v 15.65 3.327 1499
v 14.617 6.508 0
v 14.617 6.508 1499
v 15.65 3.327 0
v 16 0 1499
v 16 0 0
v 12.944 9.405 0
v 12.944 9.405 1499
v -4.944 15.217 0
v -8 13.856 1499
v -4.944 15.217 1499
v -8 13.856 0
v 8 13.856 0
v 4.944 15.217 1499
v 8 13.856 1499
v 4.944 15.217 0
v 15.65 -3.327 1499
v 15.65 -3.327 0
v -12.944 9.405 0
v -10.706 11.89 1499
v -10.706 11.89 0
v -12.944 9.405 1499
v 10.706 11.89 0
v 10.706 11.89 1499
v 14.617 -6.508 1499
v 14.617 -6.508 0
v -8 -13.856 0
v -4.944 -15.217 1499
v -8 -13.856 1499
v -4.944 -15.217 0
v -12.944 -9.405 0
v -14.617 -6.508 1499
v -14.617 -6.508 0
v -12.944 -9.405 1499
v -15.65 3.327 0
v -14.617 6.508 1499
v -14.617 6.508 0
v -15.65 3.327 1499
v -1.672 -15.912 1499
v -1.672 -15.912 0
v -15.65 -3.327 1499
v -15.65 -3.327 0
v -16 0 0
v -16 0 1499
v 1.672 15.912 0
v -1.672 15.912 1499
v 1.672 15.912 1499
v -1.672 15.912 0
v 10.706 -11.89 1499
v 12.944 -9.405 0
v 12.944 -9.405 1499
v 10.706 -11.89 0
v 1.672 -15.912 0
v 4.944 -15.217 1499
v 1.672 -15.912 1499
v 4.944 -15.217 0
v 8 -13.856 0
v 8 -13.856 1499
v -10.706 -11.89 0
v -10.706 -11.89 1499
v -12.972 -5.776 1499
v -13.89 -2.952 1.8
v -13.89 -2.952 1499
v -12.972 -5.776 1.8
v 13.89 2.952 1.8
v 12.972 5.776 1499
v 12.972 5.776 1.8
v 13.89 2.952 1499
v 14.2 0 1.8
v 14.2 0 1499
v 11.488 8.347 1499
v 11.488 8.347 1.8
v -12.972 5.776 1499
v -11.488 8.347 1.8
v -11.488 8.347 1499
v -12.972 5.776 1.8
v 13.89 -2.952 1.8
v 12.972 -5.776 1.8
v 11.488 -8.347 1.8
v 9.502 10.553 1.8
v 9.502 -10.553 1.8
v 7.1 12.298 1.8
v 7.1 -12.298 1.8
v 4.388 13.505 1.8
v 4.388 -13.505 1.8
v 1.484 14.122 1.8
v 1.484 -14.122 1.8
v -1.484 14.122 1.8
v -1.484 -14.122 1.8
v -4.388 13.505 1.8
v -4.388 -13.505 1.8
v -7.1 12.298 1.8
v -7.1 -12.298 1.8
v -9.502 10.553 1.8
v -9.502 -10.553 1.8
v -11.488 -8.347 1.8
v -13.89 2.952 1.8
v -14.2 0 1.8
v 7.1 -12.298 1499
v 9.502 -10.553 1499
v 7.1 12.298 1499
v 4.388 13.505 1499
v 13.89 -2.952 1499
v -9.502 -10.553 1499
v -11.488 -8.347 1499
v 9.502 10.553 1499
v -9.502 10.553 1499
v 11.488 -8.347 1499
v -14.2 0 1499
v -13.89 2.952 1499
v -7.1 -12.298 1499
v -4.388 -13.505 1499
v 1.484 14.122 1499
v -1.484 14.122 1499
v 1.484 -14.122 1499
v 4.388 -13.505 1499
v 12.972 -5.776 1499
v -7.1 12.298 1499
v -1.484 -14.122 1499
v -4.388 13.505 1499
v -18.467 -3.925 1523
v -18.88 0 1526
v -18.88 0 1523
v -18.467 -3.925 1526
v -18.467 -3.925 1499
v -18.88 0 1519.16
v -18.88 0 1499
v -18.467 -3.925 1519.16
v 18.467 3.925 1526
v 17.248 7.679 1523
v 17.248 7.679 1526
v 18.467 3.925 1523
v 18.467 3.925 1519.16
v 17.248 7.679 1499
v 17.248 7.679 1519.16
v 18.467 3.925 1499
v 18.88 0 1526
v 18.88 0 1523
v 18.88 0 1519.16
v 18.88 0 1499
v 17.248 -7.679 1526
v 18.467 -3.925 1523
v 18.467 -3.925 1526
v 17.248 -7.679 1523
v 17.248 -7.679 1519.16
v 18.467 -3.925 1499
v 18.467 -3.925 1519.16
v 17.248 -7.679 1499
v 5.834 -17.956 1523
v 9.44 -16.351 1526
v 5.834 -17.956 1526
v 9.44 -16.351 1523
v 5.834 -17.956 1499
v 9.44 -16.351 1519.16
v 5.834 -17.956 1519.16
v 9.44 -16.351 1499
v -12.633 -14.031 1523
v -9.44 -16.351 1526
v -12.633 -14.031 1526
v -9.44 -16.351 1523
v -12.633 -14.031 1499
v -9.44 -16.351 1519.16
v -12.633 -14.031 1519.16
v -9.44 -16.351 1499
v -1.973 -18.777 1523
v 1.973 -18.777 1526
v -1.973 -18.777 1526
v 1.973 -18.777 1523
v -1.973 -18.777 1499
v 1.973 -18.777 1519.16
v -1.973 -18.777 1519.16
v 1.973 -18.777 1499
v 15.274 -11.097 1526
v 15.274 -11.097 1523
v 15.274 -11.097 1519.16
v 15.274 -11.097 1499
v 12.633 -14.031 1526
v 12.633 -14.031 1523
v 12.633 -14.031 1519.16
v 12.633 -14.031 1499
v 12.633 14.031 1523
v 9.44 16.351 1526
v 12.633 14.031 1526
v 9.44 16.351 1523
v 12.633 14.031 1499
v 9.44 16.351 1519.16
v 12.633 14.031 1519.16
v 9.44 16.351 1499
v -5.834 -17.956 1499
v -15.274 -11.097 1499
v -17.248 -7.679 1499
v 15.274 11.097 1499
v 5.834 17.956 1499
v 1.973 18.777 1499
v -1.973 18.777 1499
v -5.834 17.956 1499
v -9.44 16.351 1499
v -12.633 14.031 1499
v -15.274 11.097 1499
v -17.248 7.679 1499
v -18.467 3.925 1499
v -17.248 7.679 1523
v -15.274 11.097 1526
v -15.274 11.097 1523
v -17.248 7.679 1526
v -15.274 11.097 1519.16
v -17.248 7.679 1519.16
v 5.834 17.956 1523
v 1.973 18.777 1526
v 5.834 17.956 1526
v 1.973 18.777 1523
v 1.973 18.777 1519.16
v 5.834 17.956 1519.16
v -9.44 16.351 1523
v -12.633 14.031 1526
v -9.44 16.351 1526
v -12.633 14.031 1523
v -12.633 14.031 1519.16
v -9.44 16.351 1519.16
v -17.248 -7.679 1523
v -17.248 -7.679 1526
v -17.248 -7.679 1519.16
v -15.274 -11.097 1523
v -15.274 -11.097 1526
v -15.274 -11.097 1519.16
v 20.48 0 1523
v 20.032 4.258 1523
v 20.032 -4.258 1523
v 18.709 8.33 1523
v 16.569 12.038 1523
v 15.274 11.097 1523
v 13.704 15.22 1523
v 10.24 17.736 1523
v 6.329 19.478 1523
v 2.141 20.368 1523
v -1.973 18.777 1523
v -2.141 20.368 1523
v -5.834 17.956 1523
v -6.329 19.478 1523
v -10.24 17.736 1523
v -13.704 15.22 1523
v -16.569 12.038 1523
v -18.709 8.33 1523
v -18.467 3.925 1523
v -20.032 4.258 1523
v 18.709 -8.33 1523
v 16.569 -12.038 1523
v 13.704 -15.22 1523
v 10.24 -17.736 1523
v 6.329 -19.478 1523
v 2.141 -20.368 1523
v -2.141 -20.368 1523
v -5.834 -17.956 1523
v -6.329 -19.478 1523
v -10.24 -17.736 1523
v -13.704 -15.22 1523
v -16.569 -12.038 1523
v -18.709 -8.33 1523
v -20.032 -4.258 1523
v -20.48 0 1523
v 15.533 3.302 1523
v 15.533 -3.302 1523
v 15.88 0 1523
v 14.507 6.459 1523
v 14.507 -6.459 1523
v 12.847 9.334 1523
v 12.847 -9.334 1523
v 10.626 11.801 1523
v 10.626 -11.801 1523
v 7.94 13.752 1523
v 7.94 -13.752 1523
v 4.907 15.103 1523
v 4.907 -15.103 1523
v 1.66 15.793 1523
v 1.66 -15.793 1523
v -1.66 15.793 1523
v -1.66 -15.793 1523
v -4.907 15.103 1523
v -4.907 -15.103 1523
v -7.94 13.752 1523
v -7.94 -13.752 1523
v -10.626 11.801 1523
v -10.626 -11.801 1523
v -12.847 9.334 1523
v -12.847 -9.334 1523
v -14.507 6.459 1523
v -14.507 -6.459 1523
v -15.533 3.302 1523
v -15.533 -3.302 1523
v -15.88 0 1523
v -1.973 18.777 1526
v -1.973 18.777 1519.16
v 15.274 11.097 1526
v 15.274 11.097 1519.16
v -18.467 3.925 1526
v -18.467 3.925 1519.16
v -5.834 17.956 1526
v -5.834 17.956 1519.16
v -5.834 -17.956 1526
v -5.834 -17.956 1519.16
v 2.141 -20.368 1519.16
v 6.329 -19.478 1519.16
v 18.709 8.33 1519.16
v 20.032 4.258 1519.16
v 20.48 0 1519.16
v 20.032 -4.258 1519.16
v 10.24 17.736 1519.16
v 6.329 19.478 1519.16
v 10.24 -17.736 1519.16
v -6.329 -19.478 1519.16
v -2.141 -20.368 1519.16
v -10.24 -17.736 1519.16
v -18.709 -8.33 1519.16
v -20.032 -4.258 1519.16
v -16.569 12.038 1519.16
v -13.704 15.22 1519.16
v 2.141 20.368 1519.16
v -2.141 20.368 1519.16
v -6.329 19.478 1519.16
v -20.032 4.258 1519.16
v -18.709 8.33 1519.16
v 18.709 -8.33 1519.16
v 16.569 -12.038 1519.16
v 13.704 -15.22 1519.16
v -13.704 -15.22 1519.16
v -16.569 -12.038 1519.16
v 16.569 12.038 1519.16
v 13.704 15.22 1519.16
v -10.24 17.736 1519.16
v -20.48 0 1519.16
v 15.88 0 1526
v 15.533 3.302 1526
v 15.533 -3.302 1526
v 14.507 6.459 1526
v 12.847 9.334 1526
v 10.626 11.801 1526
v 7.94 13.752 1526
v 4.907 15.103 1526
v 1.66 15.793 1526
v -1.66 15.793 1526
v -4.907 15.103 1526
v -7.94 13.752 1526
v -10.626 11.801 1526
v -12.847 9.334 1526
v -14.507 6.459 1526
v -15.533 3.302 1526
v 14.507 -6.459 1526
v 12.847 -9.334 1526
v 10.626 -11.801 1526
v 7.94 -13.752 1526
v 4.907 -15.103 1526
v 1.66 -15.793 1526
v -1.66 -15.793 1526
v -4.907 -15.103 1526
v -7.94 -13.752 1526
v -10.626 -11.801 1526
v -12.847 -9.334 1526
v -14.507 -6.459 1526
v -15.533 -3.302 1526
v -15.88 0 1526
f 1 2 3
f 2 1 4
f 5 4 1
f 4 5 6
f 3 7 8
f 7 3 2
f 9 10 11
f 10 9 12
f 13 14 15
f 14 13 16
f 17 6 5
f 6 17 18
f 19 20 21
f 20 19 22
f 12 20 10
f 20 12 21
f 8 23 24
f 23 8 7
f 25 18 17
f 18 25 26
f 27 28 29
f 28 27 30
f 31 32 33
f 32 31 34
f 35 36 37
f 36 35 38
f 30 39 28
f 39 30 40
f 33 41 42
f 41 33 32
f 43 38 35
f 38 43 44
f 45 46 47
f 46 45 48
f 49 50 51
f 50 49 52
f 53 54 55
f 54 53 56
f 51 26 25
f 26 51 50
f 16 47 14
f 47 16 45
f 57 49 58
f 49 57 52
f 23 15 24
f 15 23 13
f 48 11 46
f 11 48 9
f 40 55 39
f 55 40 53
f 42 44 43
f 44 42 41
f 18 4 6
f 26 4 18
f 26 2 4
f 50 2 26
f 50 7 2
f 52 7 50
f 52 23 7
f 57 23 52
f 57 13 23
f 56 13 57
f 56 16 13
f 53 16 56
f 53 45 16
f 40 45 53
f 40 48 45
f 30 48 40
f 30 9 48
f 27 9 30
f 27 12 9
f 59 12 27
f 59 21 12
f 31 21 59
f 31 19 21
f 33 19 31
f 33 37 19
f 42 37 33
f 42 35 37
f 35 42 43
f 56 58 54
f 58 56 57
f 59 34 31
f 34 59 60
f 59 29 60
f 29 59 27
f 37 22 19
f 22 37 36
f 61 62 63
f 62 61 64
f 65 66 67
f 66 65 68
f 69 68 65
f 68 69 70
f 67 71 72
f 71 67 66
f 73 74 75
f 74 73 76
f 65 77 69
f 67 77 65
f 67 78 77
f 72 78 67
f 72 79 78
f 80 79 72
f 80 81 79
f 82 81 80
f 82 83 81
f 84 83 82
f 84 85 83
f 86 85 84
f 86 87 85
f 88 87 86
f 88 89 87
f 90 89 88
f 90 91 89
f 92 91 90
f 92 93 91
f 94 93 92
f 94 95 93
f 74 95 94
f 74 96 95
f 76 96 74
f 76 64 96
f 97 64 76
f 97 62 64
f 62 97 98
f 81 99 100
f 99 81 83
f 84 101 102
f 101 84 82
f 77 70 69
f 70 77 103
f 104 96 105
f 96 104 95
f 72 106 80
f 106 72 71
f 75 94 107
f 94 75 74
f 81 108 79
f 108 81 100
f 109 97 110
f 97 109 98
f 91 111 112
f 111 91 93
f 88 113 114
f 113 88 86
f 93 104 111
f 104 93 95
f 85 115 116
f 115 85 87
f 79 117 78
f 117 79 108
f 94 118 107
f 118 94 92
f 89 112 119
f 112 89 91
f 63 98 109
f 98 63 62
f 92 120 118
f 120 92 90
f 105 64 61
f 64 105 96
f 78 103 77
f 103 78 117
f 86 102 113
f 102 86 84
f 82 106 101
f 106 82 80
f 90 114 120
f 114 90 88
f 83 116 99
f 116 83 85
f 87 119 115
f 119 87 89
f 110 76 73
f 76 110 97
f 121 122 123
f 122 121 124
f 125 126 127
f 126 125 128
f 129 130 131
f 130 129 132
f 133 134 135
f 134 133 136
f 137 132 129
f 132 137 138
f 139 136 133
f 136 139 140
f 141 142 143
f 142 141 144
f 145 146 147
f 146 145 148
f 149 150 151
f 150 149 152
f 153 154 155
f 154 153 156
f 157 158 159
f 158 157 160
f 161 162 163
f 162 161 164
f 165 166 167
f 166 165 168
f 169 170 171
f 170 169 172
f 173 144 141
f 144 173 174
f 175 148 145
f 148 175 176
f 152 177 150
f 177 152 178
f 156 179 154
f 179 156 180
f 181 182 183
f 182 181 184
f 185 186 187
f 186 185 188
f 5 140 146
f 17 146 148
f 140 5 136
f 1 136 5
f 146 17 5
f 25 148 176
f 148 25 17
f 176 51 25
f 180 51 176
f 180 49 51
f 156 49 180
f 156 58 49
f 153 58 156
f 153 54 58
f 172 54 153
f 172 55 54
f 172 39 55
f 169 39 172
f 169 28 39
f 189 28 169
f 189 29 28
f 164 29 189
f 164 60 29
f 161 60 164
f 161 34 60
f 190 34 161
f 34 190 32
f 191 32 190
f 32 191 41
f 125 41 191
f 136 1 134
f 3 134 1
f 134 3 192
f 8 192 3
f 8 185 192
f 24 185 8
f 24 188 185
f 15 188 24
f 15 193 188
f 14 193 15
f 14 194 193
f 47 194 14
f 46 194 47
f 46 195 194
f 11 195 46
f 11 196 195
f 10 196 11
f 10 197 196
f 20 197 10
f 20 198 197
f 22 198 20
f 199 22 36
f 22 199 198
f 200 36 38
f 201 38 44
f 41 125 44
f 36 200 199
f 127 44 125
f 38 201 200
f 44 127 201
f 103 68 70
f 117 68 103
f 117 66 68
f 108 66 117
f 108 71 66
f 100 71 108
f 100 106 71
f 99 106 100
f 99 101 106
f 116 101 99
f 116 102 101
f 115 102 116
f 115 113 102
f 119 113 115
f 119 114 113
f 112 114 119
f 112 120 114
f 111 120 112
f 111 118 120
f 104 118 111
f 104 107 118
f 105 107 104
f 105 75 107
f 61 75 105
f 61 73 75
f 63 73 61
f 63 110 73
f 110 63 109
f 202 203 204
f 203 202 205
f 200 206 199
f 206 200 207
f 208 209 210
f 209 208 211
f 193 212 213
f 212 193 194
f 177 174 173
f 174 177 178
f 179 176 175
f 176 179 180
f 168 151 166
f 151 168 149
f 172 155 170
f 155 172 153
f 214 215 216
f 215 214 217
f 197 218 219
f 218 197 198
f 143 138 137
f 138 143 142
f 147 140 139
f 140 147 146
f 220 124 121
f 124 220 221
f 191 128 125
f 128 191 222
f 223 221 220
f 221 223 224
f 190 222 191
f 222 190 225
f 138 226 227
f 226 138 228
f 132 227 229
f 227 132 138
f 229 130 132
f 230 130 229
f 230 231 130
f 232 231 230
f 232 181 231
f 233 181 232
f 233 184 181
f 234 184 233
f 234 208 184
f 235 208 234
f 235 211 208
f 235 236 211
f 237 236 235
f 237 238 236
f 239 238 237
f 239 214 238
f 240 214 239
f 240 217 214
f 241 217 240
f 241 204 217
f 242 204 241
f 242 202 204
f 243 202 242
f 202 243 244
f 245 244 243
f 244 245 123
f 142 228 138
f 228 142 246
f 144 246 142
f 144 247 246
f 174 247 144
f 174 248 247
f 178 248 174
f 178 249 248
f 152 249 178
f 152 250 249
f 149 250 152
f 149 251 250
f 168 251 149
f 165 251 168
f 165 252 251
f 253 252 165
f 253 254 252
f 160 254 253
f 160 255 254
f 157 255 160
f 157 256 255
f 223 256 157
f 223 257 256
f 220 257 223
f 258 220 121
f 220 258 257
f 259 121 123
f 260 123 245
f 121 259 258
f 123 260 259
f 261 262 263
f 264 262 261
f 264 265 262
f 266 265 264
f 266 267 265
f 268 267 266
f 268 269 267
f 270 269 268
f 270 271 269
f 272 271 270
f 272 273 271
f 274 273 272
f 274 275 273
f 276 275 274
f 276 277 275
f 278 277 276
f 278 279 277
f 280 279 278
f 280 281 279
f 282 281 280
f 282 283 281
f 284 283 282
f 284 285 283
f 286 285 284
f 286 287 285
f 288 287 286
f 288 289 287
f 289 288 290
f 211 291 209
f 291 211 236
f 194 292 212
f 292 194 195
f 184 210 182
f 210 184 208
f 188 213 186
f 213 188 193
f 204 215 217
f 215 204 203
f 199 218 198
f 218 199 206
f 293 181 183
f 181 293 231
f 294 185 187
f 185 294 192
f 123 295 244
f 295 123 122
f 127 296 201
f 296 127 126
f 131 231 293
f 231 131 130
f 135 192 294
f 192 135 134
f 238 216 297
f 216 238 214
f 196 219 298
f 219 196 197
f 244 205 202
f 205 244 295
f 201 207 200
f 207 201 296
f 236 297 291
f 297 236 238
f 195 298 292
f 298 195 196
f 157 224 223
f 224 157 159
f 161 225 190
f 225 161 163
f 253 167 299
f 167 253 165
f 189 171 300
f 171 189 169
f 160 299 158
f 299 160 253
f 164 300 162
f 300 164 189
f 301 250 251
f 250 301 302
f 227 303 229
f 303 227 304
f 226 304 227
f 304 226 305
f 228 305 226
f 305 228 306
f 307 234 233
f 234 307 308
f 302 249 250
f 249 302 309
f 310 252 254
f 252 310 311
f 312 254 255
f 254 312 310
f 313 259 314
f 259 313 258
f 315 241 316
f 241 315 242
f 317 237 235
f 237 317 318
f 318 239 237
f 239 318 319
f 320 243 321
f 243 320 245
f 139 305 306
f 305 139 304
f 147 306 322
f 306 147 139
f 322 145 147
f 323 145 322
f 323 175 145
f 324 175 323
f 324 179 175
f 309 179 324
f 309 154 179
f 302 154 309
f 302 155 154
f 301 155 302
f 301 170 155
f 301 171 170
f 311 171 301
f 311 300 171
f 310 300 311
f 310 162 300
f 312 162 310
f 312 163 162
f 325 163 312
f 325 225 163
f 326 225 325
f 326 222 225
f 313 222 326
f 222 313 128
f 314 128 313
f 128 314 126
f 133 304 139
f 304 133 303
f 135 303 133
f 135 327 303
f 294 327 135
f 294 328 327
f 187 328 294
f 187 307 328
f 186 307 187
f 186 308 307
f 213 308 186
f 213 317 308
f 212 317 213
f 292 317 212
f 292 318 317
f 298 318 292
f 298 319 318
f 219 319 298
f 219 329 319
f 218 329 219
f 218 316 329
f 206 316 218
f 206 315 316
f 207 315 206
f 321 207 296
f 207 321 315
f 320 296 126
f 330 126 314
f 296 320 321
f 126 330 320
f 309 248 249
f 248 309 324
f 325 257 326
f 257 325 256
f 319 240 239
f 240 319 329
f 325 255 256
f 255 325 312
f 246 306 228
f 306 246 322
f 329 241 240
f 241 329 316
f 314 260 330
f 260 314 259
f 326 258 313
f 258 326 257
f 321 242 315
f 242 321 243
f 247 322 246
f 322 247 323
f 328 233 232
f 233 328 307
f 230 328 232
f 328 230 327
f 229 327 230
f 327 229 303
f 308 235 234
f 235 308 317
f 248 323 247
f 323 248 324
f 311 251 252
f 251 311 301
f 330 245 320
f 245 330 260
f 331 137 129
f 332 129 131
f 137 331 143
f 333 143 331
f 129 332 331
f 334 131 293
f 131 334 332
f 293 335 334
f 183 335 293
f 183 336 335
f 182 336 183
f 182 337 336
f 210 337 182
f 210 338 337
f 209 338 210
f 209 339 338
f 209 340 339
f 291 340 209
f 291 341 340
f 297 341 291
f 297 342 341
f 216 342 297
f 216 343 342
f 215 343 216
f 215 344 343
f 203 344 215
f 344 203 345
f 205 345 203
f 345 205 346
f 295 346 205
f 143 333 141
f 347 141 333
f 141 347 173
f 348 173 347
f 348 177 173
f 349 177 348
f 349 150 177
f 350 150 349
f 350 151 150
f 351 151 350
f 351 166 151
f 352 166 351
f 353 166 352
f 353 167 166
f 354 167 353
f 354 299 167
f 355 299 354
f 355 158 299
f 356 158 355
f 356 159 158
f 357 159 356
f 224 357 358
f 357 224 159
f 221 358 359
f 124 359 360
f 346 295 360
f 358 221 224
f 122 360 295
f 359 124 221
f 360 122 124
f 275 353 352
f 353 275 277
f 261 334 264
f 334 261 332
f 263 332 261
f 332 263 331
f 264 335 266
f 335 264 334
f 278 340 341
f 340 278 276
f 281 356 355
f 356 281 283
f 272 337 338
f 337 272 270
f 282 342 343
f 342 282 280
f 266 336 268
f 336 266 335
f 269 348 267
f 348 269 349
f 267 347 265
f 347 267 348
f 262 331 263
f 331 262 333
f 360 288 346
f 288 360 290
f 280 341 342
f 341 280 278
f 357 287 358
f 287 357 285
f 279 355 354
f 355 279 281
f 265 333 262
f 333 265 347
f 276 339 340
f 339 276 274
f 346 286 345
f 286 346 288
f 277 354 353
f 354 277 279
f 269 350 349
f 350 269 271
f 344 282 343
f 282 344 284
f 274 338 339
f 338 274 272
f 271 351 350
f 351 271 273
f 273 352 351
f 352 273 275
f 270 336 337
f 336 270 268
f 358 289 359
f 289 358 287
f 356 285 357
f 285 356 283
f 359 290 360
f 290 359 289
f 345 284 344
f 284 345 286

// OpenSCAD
// Parameters
pipe_standard = 1; //[1:1:1]
nominal_diameter_mm = 32; //[16:64:1]
length_mm = 1500; //[750:3000:10]
center = 0; //[0:1:1]
ht32_outer_diameter = 32; //[24:40:0.5]
ht32_wall_thickness = 1.8; //[1.0:3.0:0.1]
fit_socket_od_factor = 1.18; //[1.05:1.35:0.01]
fit_socket_length_factor = 0.75; //[0.4:1.2:0.01]
fit_stop_ring_od_factor = 1.28; //[1.1:1.6:0.01]
fit_stop_ring_length_factor = 0.12; //[0.05:0.25:0.01]
fit_overlap = 1; //[0.5:2:0.1]
fit_socket_wall_extra = 1.2; //[0.5:3:0.1]

// HT Pipe - complete geometry
module ht_pipe() {
  color([0.85, 0.85, 0.8]) {
    // Pipe segment
    difference() {
      cylinder(h=length_mm, r=ht32_outer_diameter/2, center=false);
      translate([0, 0, ht32_wall_thickness])
        cylinder(h=length_mm, r=ht32_outer_diameter/2 - ht32_wall_thickness, center=false);
    }
    
    // End fitting geometry
    union() {
      // Socket outer
      translate([0, 0, length_mm - fit_overlap])
        cylinder(h=ht32_outer_diameter * fit_socket_length_factor, r=(ht32_outer_diameter * fit_socket_od_factor) / 2, center=false);
      
      // Stop ring outer
      translate([0, 0, length_mm - fit_overlap + ht32_outer_diameter * fit_socket_length_factor - ht32_outer_diameter * fit_stop_ring_length_factor])
        cylinder(h=ht32_outer_diameter * fit_stop_ring_length_factor, r=(ht32_outer_diameter * fit_stop_ring_od_factor) / 2, center=false);
    }
    
    // Socket inner void
    translate([0, 0, length_mm - fit_overlap + (ht32_wall_thickness + fit_socket_wall_extra)])
      difference() {
        cylinder(h=ht32_outer_diameter * fit_socket_length_factor, r=(ht32_outer_diameter * fit_socket_od_factor) / 2, center=false);
        cylinder(h=ht32_outer_diameter * fit_socket_length_factor, r=(ht32_outer_diameter * fit_socket_od_factor) / 2 - (ht32_wall_thickness + fit_socket_wall_extra), center=false);
      }
  }
}

// Assembly
module assembly() {
  ht_pipe();
}

assembly();
